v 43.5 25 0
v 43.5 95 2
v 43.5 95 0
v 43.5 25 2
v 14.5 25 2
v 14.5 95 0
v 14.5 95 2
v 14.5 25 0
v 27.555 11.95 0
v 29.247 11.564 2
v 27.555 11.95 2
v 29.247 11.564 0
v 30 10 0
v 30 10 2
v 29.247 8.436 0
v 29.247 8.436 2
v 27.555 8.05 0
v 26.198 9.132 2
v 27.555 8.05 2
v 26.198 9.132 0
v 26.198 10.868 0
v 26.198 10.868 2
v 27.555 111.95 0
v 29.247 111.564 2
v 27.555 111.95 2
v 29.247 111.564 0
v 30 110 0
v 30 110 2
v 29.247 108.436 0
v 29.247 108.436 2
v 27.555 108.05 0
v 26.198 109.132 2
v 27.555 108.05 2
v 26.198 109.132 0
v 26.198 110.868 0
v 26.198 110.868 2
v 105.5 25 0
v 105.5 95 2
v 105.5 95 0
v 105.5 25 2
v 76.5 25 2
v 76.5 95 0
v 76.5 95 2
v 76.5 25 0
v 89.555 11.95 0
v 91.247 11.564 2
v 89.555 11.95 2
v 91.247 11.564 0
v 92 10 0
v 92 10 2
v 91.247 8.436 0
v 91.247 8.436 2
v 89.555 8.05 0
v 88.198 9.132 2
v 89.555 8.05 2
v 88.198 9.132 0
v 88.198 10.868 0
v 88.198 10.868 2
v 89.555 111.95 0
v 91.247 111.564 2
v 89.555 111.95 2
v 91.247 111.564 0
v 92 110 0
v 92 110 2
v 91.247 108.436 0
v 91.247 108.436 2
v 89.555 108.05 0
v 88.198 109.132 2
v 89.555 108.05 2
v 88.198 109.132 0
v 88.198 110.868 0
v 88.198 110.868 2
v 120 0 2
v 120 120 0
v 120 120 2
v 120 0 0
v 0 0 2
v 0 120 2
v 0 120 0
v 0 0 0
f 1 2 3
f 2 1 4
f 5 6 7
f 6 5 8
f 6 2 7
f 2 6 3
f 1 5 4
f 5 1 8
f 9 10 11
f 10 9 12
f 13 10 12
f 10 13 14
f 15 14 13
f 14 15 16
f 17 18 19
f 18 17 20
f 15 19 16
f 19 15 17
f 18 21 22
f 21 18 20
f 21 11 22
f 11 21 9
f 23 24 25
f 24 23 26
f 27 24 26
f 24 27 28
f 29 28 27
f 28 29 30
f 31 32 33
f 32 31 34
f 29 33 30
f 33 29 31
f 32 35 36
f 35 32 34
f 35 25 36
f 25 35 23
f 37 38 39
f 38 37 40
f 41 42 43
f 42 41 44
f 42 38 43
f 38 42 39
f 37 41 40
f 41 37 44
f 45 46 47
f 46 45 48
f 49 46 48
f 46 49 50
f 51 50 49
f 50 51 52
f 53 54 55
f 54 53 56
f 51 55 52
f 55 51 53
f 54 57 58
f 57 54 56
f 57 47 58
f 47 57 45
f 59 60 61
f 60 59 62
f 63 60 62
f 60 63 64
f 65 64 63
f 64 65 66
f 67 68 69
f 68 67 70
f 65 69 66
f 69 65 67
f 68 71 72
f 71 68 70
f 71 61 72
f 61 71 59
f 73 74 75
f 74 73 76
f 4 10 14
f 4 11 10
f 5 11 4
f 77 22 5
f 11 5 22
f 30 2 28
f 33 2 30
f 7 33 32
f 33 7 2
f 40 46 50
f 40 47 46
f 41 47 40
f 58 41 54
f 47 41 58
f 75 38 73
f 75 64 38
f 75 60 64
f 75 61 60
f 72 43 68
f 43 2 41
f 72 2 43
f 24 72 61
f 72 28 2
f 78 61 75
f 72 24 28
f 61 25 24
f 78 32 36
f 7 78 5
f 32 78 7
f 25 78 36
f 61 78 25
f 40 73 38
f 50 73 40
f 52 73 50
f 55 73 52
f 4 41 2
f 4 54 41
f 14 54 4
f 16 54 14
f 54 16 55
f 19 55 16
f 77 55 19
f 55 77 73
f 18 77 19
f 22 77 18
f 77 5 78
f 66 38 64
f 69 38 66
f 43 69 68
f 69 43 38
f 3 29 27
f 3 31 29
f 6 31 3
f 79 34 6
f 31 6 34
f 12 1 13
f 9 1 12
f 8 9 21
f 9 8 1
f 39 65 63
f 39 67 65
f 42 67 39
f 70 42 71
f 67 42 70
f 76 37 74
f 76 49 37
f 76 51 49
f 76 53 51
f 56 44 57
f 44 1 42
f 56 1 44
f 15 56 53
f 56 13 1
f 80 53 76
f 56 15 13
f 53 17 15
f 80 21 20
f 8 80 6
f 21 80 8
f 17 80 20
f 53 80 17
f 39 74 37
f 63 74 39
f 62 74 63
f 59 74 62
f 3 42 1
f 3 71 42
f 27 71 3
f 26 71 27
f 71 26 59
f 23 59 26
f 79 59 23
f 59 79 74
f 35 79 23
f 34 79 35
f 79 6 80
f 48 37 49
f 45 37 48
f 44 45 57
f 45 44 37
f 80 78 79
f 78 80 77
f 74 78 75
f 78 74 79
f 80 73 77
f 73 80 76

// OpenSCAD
// Plate for AC outlet cover, 2021/2/10
//
// ** 1st Prototype **
//

t=2;


plate(t);


module acplate()
{
    //cube([48,110,  ,4]);  -- full base
    translate([(48-29)/2, (110-70)/2,0]  )  cube([29,70,  ,4]);
    
    translate([(48-2)/2, 5,0]  )  cylinder(4 ,2,2);
    translate([(48-2)/2, (110-5),0]  )  cylinder(4 ,2,2);
}

module plate(r)
{

    difference() {
        cube([120, 120, t]);
            translate([5, 5  ,-1] )  acplate();
            translate([(120-5-48), 5  ,-1] )  acplate();
    }

}
